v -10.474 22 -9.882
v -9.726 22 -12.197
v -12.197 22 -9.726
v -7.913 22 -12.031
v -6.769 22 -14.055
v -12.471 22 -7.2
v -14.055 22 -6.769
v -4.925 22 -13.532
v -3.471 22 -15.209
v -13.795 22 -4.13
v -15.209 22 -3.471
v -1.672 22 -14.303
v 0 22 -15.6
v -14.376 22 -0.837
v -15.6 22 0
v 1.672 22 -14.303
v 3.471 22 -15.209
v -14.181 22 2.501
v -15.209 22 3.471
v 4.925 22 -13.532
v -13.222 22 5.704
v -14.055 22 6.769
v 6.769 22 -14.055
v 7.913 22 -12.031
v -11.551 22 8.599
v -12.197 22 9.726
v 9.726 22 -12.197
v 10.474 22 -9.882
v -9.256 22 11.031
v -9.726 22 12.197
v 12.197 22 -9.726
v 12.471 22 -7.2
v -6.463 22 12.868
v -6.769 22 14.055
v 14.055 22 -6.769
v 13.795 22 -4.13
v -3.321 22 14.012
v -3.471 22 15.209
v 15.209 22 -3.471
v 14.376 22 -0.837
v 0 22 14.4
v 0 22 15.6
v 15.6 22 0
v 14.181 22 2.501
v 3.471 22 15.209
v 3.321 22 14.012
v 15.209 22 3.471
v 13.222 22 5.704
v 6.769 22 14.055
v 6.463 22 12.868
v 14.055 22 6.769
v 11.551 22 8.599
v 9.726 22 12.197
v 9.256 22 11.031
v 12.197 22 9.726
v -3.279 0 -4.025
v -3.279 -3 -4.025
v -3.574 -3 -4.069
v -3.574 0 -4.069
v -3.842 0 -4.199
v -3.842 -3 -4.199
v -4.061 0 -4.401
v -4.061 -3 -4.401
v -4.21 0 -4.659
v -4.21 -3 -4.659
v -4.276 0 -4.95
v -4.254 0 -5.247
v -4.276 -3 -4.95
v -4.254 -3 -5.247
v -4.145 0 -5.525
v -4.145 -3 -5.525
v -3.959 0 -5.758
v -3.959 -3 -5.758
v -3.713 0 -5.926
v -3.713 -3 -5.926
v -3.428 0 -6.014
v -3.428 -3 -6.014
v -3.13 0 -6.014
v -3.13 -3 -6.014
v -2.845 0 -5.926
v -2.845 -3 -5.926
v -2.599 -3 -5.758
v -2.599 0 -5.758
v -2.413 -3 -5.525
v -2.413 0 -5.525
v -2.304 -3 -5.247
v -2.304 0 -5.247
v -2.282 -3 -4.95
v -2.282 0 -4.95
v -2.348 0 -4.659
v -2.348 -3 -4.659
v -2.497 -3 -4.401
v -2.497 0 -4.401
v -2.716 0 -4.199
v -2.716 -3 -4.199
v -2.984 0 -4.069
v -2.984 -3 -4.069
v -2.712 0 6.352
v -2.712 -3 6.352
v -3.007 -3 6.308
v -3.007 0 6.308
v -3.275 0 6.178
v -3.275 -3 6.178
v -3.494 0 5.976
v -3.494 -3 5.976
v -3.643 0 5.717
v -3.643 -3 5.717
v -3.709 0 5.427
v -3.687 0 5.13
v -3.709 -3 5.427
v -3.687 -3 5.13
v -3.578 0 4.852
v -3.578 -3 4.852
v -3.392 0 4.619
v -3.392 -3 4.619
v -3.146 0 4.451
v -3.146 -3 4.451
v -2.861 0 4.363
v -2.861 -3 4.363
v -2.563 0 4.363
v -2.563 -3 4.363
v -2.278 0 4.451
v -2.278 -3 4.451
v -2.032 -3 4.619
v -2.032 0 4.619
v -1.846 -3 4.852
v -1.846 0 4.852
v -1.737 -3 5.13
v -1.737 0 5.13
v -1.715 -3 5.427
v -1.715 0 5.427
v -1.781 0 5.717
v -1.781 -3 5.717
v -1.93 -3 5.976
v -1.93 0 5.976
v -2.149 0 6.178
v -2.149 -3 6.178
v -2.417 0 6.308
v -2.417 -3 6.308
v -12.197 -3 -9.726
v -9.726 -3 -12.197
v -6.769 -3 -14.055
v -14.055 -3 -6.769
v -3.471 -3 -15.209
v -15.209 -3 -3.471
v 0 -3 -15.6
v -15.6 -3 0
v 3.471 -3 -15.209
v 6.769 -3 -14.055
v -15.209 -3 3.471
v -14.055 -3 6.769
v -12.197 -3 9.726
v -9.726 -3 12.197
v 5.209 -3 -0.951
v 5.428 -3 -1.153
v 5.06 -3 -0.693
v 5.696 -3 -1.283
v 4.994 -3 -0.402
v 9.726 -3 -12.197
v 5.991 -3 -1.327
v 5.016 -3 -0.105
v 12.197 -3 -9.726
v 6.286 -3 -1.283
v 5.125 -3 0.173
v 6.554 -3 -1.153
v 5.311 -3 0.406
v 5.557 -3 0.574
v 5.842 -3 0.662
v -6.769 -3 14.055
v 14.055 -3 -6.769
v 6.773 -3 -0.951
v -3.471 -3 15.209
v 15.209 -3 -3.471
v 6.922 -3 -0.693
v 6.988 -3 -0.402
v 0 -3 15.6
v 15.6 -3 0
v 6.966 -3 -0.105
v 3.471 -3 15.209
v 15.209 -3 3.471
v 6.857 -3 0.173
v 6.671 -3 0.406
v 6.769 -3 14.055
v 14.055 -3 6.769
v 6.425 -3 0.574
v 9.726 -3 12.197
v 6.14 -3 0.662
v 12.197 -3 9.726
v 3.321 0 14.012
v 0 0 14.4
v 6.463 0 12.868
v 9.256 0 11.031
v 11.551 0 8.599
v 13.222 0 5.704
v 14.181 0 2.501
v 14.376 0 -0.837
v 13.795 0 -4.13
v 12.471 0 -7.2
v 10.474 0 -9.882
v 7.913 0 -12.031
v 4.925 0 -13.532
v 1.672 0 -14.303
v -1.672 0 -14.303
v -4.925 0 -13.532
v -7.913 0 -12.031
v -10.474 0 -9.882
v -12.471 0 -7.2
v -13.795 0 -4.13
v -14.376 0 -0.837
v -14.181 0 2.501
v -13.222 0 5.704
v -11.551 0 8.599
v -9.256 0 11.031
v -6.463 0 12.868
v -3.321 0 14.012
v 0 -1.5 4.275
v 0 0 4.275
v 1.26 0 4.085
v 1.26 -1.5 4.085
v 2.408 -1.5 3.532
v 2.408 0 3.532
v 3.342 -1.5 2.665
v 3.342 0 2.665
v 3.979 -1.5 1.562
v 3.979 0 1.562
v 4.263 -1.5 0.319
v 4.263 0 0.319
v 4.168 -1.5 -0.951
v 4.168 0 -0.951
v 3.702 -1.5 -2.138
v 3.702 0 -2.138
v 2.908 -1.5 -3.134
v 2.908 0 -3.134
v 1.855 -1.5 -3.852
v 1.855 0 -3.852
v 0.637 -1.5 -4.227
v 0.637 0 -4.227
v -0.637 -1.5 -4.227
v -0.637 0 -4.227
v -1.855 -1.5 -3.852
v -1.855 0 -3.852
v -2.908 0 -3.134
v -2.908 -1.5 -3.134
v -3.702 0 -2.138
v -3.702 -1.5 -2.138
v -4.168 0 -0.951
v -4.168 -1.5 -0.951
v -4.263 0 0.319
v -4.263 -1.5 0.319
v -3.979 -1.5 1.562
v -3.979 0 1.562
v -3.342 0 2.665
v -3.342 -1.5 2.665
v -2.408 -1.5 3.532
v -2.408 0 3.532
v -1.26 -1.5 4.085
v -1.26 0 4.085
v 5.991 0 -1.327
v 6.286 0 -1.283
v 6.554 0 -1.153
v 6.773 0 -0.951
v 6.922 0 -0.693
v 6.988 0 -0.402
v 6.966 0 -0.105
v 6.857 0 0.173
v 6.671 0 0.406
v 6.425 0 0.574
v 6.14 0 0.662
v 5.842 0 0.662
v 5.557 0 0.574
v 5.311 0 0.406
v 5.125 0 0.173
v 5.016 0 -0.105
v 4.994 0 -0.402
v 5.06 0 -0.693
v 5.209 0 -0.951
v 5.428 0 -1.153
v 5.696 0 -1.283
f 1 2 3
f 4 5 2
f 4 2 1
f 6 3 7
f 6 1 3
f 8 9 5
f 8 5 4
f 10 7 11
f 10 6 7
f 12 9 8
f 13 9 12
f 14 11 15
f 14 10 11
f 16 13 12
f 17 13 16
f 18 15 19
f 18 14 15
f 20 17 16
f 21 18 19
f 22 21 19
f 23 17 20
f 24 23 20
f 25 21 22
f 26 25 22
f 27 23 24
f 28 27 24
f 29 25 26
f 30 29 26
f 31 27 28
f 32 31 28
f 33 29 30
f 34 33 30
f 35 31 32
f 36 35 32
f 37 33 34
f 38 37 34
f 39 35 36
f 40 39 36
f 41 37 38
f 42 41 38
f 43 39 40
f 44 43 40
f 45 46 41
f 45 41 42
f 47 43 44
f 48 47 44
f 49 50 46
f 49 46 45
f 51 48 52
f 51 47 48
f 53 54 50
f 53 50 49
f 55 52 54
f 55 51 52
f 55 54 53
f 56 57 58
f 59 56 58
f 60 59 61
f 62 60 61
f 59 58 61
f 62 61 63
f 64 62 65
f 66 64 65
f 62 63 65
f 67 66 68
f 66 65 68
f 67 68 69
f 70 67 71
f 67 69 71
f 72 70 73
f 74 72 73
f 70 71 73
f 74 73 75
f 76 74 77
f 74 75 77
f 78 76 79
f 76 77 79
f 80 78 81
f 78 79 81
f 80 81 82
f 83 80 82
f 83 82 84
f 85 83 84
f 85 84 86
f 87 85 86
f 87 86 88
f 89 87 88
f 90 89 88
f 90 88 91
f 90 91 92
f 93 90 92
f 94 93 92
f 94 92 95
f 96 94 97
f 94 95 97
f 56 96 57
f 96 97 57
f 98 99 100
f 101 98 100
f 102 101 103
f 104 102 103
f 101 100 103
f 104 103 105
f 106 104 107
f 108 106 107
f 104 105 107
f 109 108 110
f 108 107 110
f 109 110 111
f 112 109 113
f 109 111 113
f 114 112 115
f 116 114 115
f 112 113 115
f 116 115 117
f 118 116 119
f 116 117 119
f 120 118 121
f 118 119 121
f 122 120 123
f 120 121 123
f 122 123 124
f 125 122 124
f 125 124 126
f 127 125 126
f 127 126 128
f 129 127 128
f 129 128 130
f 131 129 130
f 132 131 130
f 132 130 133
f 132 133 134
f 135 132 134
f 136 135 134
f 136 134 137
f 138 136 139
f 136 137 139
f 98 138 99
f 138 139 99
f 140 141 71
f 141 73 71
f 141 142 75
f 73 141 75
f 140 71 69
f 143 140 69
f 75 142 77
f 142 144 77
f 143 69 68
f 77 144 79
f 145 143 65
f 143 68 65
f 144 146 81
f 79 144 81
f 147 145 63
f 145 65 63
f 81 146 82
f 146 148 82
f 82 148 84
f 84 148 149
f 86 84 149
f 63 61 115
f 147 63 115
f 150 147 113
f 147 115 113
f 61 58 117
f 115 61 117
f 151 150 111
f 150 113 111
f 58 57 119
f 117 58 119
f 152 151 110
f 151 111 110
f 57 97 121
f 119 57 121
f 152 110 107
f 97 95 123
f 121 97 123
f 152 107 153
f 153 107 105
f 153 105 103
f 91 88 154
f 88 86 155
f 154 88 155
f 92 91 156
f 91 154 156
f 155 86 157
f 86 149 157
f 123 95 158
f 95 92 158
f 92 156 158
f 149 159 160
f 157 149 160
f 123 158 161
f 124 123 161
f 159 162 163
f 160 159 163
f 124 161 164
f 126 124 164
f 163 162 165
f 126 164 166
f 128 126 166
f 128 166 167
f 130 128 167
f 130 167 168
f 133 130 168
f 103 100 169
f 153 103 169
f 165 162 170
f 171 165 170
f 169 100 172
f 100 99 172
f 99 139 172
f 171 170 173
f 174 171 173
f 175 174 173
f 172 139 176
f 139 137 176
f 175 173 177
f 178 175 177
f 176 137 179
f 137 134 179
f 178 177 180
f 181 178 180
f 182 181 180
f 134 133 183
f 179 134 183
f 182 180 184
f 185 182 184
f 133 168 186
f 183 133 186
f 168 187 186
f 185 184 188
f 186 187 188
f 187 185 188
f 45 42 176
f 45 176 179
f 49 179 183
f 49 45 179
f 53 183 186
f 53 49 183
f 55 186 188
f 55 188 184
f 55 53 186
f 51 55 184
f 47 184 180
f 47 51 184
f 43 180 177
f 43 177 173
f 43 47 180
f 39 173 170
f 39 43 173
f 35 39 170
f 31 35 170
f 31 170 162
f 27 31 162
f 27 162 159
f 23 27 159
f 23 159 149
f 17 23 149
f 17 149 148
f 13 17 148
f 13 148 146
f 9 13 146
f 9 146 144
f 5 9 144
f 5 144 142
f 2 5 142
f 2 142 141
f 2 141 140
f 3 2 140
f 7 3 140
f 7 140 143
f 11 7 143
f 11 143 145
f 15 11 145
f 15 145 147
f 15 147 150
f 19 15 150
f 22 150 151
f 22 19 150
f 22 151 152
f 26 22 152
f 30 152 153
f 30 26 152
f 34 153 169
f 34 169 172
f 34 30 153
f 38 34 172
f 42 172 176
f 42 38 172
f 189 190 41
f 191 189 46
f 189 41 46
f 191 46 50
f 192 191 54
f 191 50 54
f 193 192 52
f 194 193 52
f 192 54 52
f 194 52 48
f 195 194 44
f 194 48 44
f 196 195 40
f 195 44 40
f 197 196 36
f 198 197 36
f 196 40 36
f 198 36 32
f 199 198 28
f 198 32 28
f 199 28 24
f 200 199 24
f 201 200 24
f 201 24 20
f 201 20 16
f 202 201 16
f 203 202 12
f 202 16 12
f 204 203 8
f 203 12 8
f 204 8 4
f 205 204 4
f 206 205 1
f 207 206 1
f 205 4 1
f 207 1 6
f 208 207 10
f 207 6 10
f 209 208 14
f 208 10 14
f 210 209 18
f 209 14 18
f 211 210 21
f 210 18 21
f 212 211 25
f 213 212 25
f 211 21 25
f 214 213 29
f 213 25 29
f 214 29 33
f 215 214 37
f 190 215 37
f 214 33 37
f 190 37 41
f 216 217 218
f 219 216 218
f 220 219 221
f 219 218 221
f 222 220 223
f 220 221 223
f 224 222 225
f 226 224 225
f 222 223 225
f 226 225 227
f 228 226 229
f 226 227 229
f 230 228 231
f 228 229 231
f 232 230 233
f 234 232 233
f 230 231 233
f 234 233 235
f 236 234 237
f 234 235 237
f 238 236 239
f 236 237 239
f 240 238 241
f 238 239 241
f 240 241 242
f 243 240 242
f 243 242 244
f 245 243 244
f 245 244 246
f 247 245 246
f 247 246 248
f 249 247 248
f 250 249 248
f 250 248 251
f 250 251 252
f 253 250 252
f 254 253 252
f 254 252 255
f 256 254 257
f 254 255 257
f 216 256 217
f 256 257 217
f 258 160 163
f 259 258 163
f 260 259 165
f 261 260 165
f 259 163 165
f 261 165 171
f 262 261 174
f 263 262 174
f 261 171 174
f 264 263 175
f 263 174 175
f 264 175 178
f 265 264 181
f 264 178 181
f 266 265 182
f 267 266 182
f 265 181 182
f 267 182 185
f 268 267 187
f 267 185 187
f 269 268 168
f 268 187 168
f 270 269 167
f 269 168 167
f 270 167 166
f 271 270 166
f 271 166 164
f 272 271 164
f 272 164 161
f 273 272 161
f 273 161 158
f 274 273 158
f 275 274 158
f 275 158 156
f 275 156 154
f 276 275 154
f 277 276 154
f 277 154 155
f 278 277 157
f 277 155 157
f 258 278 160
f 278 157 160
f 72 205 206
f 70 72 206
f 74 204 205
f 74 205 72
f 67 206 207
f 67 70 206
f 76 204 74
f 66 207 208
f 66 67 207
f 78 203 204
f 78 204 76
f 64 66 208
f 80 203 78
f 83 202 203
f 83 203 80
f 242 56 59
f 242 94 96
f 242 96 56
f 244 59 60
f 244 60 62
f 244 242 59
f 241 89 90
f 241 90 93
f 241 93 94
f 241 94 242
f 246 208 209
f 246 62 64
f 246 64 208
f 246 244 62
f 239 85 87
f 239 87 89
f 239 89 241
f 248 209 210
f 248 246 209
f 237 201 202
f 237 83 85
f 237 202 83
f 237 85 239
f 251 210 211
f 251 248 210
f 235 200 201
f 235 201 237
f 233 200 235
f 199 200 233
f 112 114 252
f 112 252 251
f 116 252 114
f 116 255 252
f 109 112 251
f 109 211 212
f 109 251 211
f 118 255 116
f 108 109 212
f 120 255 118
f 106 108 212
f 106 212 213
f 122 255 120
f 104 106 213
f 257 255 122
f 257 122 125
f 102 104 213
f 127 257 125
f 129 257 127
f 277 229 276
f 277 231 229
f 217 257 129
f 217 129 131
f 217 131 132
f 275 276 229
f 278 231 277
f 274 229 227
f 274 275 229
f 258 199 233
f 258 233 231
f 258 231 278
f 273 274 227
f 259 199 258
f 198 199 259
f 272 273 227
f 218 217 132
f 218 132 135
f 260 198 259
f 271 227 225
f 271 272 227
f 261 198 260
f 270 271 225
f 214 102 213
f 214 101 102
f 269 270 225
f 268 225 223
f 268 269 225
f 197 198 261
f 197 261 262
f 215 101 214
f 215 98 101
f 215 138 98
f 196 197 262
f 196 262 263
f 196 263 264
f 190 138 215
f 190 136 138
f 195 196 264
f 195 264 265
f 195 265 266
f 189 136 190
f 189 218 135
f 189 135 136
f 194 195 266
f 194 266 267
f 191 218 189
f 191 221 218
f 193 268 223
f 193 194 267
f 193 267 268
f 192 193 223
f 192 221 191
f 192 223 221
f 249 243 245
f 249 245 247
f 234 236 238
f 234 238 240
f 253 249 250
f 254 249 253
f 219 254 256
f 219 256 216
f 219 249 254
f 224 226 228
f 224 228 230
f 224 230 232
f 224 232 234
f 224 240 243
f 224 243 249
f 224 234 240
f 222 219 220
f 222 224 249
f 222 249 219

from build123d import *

# Parameters (mm, degrees)
SKETCH1_R           = 15.6
BOSS_EXTRUDE1_DEPTH = 3
SKETCH2_R           = 4.275
CUT_EXTRUDE1_DEPTH  = 1.5
BOSS_EXTRUDE2_START = 22
SKETCH3_R           = 15.6
SKETCH3_R_2         = 14.4
BOSS_EXTRUDE2_DEPTH = 22
SKETCH4_R           = 1
CUT_EXTRUDE3_DEPTH  = 3


with BuildPart() as part:
    # Sketch1 → Boss-Extrude1 (new body)
    with BuildSketch(Plane(origin=(0, 0, 0), x_dir=(1, 0, 0), z_dir=(0, 1, 0))):
        with Locations(Location((0, 0, 0), (0, 0, 270))):
            Circle(SKETCH1_R)
    extrude(amount=-BOSS_EXTRUDE1_DEPTH)

    # Sketch2 → Cut-Extrude1 (cut)
    with BuildSketch(Plane(origin=(0, 0, 0), x_dir=(1, 0, 0), z_dir=(0, 1, 0))):
        with Locations(Location((0, 0, 0), (0, 0, 270))):
            Circle(SKETCH2_R)
    extrude(amount=-CUT_EXTRUDE1_DEPTH, mode=Mode.SUBTRACT)

    # Sketch3 → Boss-Extrude2 (add)
    with BuildSketch(Plane(origin=(0, 0, 0), x_dir=(1, 0, 0), z_dir=(0, 1, 0)).offset(BOSS_EXTRUDE2_START)):
        with Locations(Location((0, 0, 0), (0, 0, 270))):
            Circle(SKETCH3_R)
        with Locations(Location((0, 0, 0), (0, 0, 270))):
            Circle(SKETCH3_R_2, mode=Mode.SUBTRACT)
    extrude(amount=-BOSS_EXTRUDE2_DEPTH)

    # Sketch4 → Cut-Extrude3 (cut)
    with BuildSketch(Plane(origin=(0, -3, 0), x_dir=(-1, 0, 0), z_dir=(0, -1, 0))):
        with Locations(Location((-5.991069688, 0.327236899, 0), (0, 0, 90))):
            Circle(SKETCH4_R)
        with Locations(Location((3.278930312, 5.024800097, 0), (0, 0, 270))):
            Circle(SKETCH4_R)
        with Locations(Location((2.712139377, -5.352036995, 0), (0, 0, 270))):
            Circle(SKETCH4_R)
    extrude(amount=-CUT_EXTRUDE3_DEPTH, mode=Mode.SUBTRACT)


solid = part.part
